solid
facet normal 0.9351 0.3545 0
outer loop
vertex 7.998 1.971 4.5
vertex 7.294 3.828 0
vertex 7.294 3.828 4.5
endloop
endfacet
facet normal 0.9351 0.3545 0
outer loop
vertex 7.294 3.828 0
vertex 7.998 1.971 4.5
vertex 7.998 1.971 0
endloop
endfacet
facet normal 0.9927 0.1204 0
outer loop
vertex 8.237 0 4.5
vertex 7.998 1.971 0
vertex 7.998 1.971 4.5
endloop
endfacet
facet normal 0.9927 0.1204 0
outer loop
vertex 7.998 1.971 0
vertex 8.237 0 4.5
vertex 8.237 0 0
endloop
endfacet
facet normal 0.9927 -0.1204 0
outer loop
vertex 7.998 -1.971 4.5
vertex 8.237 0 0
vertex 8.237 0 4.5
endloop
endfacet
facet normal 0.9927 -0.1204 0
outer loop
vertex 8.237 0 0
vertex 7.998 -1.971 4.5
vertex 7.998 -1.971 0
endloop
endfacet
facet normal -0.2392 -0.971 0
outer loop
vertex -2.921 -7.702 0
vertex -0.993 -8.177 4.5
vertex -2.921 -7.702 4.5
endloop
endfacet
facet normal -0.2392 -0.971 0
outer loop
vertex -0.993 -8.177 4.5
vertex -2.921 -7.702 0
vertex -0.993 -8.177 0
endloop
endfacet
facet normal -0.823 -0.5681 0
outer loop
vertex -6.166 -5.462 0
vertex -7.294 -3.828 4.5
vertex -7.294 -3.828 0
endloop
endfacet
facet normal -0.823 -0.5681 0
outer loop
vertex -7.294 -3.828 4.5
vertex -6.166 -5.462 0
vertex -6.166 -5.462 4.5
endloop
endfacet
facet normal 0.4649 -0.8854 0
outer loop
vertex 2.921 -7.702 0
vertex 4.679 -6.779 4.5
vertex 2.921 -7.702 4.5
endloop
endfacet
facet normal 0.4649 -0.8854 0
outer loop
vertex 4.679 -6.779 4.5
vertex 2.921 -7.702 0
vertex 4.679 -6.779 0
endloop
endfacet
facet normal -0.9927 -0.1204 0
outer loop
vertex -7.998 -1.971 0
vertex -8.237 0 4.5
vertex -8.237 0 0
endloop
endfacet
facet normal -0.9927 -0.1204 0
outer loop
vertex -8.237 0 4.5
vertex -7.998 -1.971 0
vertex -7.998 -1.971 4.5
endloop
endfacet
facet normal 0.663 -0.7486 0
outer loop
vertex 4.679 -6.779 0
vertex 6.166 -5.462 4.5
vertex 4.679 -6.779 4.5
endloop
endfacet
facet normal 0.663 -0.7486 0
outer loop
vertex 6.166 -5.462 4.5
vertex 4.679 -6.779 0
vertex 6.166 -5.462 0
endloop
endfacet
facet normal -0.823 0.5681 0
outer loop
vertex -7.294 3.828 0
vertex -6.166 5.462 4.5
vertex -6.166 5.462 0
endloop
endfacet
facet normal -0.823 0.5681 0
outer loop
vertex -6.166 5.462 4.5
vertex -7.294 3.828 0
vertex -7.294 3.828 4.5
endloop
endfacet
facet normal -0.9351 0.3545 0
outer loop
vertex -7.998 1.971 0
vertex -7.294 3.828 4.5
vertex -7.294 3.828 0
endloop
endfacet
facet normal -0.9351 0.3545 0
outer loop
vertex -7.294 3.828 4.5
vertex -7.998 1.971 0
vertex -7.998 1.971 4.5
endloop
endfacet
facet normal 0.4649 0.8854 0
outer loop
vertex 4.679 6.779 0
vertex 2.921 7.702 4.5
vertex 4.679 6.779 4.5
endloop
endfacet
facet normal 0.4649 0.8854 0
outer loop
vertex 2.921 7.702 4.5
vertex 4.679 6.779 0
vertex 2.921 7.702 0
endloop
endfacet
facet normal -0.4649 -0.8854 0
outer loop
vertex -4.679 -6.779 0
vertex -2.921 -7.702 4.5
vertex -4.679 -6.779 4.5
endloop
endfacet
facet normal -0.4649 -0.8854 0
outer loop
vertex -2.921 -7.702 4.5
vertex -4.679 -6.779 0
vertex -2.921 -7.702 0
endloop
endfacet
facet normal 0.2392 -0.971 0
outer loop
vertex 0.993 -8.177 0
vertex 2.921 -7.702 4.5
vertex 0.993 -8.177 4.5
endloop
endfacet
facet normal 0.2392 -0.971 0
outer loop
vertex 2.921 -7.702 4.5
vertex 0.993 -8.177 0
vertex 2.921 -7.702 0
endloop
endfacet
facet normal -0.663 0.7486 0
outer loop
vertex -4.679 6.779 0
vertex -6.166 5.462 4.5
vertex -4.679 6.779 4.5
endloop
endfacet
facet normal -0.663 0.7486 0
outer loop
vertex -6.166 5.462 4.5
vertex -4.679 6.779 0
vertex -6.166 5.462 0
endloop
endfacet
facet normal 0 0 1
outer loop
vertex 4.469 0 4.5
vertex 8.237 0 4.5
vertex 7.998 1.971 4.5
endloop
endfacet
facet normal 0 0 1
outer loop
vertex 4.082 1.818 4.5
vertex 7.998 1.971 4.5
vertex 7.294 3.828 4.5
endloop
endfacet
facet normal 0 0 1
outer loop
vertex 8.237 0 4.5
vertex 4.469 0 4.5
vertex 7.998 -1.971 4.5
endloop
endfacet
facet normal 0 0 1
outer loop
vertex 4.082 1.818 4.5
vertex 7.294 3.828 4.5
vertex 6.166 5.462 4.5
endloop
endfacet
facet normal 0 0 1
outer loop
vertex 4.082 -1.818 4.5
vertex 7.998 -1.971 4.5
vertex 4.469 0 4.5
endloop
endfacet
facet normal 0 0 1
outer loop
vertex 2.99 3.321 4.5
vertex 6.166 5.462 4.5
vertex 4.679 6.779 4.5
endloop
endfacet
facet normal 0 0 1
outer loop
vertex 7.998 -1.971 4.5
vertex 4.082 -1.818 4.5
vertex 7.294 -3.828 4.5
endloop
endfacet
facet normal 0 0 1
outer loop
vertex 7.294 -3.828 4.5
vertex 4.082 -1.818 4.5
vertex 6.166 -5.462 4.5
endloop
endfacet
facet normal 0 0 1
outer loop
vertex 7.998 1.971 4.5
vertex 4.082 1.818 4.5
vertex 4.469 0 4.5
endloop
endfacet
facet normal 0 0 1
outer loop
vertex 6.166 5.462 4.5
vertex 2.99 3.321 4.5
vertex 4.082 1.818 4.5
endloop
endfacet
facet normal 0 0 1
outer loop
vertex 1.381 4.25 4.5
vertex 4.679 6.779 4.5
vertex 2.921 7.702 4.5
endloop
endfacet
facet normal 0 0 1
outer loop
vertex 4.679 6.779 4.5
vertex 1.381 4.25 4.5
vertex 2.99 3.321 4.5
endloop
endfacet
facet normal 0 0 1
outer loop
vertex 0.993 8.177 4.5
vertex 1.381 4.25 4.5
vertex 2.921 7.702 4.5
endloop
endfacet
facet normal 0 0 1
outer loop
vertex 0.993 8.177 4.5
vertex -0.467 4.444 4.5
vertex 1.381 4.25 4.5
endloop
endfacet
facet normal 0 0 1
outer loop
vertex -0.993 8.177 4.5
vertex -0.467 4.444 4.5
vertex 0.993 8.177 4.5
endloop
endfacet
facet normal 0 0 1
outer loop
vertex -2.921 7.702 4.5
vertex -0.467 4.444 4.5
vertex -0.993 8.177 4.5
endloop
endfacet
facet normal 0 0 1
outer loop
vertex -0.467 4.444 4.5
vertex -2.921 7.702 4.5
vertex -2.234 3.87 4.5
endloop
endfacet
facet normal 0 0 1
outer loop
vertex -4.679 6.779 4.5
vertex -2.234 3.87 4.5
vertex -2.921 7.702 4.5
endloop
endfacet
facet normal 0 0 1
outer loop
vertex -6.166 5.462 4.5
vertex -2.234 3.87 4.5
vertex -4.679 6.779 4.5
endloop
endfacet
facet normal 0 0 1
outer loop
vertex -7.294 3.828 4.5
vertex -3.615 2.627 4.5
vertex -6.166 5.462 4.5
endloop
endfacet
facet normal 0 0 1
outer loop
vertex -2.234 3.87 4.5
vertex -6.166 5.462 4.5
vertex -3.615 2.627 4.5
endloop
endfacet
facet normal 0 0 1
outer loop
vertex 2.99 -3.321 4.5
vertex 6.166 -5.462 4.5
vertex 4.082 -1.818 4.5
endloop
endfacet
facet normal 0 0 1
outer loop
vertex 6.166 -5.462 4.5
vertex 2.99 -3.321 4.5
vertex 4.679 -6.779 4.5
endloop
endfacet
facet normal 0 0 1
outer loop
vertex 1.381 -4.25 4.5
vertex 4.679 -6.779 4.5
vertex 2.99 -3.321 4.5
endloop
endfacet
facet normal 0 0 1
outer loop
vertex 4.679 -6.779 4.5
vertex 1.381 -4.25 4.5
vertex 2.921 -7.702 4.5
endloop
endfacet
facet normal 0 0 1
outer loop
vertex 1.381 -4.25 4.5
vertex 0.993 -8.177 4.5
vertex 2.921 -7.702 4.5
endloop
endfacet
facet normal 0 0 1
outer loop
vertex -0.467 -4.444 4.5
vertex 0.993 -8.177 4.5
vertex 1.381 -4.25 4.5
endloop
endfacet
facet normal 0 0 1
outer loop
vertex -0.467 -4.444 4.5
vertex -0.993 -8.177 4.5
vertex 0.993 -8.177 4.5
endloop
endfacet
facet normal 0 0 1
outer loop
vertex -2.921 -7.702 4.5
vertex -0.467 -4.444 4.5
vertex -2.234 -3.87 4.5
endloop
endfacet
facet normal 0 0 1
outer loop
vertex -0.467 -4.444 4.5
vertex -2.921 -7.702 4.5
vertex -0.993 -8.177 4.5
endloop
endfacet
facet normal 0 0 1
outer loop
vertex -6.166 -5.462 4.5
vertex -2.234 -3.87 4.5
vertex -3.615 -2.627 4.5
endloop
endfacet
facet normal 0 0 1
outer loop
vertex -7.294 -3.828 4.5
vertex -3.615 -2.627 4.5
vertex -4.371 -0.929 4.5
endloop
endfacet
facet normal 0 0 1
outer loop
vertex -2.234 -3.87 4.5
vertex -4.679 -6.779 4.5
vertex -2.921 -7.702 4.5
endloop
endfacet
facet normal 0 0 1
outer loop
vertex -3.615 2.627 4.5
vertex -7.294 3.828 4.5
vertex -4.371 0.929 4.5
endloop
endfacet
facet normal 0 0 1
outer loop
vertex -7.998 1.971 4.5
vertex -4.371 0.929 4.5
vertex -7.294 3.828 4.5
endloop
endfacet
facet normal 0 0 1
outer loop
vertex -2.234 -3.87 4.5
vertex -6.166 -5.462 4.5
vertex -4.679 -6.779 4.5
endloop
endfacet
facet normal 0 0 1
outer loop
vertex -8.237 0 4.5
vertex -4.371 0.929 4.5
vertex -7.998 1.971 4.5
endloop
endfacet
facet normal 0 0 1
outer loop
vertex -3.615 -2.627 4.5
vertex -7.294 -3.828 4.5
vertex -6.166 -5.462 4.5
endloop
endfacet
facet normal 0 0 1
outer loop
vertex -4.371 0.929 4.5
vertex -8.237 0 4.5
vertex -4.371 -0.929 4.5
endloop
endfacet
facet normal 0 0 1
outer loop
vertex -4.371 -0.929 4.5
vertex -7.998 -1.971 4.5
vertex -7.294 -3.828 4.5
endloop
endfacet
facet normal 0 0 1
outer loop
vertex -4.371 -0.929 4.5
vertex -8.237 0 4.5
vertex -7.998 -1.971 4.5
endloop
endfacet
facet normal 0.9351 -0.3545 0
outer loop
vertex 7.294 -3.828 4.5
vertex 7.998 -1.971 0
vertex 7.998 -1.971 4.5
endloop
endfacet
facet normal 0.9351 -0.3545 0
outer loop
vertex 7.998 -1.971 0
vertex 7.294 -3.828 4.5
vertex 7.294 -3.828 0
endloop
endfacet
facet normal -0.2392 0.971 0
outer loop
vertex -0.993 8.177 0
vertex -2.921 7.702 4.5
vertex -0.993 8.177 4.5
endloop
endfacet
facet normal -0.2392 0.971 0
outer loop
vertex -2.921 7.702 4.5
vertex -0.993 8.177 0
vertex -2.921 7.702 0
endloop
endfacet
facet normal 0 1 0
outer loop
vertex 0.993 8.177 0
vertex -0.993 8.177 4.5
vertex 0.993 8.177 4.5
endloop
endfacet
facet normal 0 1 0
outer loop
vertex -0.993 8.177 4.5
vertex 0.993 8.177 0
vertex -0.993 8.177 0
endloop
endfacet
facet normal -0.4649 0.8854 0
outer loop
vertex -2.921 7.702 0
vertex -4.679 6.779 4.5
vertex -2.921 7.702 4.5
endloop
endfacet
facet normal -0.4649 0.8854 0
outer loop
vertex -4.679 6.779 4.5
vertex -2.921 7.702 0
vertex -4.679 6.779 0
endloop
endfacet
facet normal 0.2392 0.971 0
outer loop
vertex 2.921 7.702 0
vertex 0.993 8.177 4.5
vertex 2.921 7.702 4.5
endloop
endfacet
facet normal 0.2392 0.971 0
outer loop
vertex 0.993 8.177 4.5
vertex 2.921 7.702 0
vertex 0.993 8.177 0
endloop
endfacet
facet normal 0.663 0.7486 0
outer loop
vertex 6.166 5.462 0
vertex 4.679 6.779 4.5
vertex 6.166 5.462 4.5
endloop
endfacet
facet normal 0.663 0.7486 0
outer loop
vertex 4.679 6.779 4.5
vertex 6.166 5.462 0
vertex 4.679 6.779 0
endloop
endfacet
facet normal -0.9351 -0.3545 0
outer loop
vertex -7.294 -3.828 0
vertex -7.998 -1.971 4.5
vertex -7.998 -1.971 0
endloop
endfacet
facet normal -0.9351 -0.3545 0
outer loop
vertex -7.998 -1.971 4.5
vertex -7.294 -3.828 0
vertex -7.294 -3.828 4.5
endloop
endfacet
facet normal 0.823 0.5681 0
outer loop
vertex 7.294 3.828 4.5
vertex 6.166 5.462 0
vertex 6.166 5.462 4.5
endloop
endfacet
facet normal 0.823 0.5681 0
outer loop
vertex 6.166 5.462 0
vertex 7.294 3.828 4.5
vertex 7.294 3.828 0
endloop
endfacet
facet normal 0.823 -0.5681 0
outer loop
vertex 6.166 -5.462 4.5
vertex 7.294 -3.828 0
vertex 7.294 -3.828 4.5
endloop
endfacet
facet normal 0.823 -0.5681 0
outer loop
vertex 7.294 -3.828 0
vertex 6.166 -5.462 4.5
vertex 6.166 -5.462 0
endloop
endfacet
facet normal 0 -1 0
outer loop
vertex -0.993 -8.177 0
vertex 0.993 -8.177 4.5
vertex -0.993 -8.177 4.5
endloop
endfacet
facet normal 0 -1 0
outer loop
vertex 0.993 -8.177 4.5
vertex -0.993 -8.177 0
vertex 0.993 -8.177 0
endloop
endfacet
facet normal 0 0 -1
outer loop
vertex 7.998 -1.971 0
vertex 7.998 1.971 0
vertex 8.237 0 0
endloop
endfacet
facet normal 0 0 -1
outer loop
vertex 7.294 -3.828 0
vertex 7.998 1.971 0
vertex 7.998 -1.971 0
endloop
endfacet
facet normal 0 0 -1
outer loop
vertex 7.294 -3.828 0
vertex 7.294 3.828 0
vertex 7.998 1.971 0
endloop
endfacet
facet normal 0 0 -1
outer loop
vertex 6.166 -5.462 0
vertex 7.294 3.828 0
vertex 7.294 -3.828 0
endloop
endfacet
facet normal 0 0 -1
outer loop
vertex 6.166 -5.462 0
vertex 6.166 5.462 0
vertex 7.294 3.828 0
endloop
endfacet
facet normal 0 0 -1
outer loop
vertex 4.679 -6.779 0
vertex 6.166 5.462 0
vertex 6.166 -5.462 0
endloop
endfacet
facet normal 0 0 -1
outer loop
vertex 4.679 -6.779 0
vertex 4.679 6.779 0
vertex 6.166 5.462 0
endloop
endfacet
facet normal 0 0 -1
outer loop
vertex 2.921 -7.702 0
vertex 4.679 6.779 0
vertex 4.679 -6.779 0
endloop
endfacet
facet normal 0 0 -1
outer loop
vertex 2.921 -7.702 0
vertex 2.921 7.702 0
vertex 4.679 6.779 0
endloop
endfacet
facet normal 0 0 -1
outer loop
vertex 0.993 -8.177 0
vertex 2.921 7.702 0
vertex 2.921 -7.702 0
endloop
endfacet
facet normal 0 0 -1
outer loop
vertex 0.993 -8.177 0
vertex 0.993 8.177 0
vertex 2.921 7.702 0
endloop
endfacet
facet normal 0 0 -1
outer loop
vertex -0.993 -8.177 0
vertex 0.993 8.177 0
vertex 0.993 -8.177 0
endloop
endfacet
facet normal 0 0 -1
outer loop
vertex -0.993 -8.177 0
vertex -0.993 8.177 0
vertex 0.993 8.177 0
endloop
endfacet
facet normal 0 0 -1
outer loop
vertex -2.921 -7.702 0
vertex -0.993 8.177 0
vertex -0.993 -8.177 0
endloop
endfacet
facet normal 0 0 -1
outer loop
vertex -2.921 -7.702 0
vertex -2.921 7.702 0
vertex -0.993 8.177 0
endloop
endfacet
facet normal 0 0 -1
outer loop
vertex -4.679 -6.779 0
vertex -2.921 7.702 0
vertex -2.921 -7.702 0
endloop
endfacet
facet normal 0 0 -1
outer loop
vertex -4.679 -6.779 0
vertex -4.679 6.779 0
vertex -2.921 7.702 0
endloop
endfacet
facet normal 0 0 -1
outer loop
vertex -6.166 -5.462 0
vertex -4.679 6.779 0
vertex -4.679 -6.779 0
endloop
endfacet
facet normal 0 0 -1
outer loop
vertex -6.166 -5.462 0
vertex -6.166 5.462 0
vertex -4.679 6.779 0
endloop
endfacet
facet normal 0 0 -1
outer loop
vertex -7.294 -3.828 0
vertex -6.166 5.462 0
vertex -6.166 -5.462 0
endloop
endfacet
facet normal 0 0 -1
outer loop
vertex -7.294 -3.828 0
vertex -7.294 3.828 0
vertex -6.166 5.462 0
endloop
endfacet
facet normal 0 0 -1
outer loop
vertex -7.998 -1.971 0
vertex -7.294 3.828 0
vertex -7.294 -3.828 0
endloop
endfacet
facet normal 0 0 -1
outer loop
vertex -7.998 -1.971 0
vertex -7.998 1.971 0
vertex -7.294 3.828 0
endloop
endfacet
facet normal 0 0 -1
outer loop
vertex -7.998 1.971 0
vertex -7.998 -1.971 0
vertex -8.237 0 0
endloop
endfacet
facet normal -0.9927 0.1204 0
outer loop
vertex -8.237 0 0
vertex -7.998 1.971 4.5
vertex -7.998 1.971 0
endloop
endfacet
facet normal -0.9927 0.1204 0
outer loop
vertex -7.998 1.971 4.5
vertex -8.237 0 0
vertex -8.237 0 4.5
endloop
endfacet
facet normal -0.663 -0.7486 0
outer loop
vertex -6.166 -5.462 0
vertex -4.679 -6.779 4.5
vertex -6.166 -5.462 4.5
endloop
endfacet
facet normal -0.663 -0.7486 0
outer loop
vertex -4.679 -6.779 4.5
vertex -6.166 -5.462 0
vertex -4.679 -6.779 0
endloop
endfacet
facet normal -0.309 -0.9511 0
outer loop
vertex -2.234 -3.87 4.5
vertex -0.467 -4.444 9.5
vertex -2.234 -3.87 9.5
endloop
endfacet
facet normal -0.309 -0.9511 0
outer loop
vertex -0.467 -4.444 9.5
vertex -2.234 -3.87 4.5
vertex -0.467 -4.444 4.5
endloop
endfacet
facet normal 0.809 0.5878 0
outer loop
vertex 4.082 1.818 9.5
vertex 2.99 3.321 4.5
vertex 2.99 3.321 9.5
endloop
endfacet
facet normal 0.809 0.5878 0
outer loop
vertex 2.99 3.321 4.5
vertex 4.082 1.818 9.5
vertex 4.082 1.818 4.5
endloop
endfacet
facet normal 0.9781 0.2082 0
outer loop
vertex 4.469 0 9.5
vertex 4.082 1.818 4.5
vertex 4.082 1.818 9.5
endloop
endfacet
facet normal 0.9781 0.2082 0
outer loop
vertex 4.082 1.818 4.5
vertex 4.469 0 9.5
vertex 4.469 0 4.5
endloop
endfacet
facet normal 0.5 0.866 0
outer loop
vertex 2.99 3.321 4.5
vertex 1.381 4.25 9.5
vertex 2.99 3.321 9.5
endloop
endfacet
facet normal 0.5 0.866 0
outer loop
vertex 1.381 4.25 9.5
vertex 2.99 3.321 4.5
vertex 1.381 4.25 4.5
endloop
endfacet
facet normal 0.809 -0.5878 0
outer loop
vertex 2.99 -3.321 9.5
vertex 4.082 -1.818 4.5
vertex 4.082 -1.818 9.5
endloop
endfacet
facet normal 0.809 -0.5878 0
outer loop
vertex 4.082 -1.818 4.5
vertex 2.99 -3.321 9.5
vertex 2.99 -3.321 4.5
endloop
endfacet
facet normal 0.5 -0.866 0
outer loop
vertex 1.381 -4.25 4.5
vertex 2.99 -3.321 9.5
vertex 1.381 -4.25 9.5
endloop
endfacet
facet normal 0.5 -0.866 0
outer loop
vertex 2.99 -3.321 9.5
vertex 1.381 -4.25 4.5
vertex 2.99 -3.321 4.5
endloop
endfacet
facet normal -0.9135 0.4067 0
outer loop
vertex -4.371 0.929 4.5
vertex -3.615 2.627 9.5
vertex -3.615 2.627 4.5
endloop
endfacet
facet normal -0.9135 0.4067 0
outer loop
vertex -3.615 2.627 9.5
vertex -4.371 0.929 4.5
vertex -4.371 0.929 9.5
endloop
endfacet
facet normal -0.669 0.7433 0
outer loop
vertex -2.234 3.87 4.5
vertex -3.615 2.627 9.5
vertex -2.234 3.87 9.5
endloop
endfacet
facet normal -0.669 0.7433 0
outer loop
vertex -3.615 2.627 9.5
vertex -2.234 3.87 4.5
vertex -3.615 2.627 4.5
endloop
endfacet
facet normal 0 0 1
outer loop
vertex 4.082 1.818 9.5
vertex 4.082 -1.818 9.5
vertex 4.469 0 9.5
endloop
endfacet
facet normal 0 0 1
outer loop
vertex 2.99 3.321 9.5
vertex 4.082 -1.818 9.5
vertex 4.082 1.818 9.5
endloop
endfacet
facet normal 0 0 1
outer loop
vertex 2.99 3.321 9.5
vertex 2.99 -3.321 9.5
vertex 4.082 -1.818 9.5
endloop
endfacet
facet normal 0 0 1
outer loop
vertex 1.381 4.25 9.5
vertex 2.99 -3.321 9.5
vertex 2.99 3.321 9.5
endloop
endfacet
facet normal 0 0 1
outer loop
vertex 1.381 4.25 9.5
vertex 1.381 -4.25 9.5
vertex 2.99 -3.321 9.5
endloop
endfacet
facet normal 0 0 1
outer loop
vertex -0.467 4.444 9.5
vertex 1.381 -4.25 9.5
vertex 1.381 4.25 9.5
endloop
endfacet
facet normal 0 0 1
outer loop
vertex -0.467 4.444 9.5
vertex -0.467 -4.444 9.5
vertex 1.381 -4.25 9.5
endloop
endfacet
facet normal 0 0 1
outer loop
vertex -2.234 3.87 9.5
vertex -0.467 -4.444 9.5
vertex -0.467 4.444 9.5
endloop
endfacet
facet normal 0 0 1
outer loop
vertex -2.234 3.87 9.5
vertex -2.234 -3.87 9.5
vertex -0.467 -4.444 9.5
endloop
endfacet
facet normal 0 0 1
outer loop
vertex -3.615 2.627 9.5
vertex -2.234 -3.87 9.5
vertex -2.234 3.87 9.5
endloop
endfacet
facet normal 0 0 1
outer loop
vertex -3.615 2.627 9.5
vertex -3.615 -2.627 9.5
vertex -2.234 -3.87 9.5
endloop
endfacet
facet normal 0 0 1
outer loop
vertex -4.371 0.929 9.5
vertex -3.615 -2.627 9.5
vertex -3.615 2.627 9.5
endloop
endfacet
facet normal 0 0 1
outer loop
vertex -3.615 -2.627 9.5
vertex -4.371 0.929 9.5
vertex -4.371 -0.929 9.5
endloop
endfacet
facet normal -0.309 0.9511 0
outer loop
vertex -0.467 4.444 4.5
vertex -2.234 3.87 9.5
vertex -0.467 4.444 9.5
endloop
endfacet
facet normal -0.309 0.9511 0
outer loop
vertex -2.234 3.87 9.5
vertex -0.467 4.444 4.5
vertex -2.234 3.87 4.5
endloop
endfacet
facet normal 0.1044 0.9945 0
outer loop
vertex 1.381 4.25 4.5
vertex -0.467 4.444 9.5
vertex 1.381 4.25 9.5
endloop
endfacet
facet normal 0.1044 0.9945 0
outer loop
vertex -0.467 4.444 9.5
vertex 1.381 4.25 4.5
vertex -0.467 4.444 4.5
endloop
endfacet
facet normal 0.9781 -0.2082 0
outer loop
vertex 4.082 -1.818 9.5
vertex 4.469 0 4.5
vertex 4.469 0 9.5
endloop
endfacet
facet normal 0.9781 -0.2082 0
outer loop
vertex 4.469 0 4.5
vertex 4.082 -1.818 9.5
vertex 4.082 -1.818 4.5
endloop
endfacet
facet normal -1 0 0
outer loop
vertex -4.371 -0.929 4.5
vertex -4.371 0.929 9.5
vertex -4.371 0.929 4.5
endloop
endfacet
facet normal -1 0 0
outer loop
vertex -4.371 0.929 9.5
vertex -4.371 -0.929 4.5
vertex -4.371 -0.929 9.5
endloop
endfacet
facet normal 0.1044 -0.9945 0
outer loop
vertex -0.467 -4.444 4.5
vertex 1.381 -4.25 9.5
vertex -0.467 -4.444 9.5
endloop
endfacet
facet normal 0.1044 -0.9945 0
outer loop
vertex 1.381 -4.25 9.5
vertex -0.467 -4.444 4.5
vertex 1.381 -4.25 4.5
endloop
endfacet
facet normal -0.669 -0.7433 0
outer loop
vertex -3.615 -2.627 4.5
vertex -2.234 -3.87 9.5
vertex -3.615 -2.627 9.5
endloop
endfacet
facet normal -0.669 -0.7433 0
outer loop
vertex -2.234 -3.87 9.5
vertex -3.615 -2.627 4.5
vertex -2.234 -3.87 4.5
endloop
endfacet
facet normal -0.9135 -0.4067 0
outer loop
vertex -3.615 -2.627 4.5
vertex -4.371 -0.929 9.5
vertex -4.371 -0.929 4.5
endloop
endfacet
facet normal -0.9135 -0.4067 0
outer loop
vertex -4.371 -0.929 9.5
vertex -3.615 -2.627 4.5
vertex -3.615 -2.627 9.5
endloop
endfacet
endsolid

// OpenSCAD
// =====================================================
// CALCULADORA DE AVELLANADO - TORNILLOS WHITWORTH (BSW)
// El diámetro de rosca se ingresa en PULGADAS (decimal)
// Ej: 1/4" = 0.25 , 3/8" = 0.375 , 1/2" = 0.5
// =====================================================

PULGADA = 25.4; // mm por pulgada

// Convierte pulgadas a mm
function pulg_a_mm(p) = p * PULGADA;

// Tabla de diámetros nominales Whitworth más comunes (en pulgadas)
// junto a su equivalente en mm, para referencia:
// 1/8"  = 3.175 mm      5/16" = 7.938 mm      5/8" = 15.875 mm
// 3/16" = 4.763 mm      3/8"  = 9.525 mm      3/4" = 19.050 mm
// 1/4"  = 6.350 mm      7/16" = 11.113 mm     7/8" = 22.225 mm
// 5/16" = 7.938 mm      1/2"  = 12.700 mm     1"   = 25.400 mm

// Función que calcula [DK, K] en mm según el diámetro de rosca
// D_pulg: diámetro nominal en pulgadas (ej: 0.25 para 1/4")
// NOTA: al no existir una norma DIN/ISO de cabeza avellanada para
// Whitworth, se usa la regla práctica DK≈2*D, K≈0.6*D.
// Ajustar si contás con la tabla real del fabricante.
function cabeza_tornillo_whitworth(D_pulg) =
    let(D = pulg_a_mm(D_pulg))
    [D * 2.0, D * 0.6];

// =====================================================
// MÓDULO: AVELLANADO PARA TORNILLO WHITWORTH
// =====================================================
module avellanado_cilindrico_whitworth(
    diametro_rosca_pulg,      // Diámetro del tornillo en PULGADAS
    profundidad_avellano,     // Profundidad del avellanado en mm
    holgura = 0.3             // Holgura para el diámetro en mm
) {
    datos = cabeza_tornillo_whitworth(diametro_rosca_pulg);
    diametro_cabeza = datos[0];

    translate([0, 0, 0])
        cylinder(h = profundidad_avellano,
                 r = (diametro_cabeza/2) + holgura);
}

// =====================================================
// MÓDULO: AGUJERO PASANTE PARA TORNILLO WHITWORTH
// =====================================================
module agujero_pasante_whitworth(
    diametro_rosca_pulg,       // Diámetro del tornillo en PULGADAS
    profundidad,                // Profundidad total del agujero
    profundidad_avellano = 0,   // Suma del hueco de avellanado
    holgura = 0.5,               // Holgura para el diámetro en mm
    profundidad_abs = true
) {
    diametro_rosca_mm = pulg_a_mm(diametro_rosca_pulg);

    if (profundidad_abs)
        translate([0, 0, profundidad_avellano])
            cylinder(h = profundidad - profundidad_avellano,
                     r = (diametro_rosca_mm/2) + holgura);
    else
        translate([0, 0, profundidad_avellano])
            cylinder(h = profundidad,
                     r = (diametro_rosca_mm/2) + holgura);
}

// =====================================================
// MÓDULO COMBINADO - AVELLANADO + AGUJERO (WHITWORTH)
// =====================================================
module agujero_con_avellanado_whitworth(
    diametro_rosca_pulg,        // Diámetro del tornillo en PULGADAS
    profundidad_avellano,       // Profundidad del avellanado en mm
    profundidad_pieza,          // Grosor total de la pieza en mm
    holgura_avellano = 0.3,
    holgura_pasante = 0.5,
    profundidad_abs = true
) {
    avellanado_cilindrico_whitworth(
        diametro_rosca_pulg = diametro_rosca_pulg,
        profundidad_avellano = profundidad_avellano,
        holgura = holgura_avellano
    );

    agujero_pasante_whitworth(
        diametro_rosca_pulg = diametro_rosca_pulg,
        profundidad = profundidad_pieza,
        profundidad_avellano = profundidad_avellano,
        holgura = holgura_pasante,
        profundidad_abs = profundidad_abs
    );
}

// Funciones de utilidad
function diametro_cabeza_whitworth(D_pulg) = cabeza_tornillo_whitworth(D_pulg)[0];
function altura_cabeza_whitworth(D_pulg) = cabeza_tornillo_whitworth(D_pulg)[1];

// =====================================================
// EJEMPLO: tornillo Whitworth 5/16" (0.3125"), avellanado
// de 4.5mm de profundidad, pieza de 9.5mm de espesor
// =====================================================
agujero_con_avellanado_whitworth(5/16, 4.5, 9.5);
